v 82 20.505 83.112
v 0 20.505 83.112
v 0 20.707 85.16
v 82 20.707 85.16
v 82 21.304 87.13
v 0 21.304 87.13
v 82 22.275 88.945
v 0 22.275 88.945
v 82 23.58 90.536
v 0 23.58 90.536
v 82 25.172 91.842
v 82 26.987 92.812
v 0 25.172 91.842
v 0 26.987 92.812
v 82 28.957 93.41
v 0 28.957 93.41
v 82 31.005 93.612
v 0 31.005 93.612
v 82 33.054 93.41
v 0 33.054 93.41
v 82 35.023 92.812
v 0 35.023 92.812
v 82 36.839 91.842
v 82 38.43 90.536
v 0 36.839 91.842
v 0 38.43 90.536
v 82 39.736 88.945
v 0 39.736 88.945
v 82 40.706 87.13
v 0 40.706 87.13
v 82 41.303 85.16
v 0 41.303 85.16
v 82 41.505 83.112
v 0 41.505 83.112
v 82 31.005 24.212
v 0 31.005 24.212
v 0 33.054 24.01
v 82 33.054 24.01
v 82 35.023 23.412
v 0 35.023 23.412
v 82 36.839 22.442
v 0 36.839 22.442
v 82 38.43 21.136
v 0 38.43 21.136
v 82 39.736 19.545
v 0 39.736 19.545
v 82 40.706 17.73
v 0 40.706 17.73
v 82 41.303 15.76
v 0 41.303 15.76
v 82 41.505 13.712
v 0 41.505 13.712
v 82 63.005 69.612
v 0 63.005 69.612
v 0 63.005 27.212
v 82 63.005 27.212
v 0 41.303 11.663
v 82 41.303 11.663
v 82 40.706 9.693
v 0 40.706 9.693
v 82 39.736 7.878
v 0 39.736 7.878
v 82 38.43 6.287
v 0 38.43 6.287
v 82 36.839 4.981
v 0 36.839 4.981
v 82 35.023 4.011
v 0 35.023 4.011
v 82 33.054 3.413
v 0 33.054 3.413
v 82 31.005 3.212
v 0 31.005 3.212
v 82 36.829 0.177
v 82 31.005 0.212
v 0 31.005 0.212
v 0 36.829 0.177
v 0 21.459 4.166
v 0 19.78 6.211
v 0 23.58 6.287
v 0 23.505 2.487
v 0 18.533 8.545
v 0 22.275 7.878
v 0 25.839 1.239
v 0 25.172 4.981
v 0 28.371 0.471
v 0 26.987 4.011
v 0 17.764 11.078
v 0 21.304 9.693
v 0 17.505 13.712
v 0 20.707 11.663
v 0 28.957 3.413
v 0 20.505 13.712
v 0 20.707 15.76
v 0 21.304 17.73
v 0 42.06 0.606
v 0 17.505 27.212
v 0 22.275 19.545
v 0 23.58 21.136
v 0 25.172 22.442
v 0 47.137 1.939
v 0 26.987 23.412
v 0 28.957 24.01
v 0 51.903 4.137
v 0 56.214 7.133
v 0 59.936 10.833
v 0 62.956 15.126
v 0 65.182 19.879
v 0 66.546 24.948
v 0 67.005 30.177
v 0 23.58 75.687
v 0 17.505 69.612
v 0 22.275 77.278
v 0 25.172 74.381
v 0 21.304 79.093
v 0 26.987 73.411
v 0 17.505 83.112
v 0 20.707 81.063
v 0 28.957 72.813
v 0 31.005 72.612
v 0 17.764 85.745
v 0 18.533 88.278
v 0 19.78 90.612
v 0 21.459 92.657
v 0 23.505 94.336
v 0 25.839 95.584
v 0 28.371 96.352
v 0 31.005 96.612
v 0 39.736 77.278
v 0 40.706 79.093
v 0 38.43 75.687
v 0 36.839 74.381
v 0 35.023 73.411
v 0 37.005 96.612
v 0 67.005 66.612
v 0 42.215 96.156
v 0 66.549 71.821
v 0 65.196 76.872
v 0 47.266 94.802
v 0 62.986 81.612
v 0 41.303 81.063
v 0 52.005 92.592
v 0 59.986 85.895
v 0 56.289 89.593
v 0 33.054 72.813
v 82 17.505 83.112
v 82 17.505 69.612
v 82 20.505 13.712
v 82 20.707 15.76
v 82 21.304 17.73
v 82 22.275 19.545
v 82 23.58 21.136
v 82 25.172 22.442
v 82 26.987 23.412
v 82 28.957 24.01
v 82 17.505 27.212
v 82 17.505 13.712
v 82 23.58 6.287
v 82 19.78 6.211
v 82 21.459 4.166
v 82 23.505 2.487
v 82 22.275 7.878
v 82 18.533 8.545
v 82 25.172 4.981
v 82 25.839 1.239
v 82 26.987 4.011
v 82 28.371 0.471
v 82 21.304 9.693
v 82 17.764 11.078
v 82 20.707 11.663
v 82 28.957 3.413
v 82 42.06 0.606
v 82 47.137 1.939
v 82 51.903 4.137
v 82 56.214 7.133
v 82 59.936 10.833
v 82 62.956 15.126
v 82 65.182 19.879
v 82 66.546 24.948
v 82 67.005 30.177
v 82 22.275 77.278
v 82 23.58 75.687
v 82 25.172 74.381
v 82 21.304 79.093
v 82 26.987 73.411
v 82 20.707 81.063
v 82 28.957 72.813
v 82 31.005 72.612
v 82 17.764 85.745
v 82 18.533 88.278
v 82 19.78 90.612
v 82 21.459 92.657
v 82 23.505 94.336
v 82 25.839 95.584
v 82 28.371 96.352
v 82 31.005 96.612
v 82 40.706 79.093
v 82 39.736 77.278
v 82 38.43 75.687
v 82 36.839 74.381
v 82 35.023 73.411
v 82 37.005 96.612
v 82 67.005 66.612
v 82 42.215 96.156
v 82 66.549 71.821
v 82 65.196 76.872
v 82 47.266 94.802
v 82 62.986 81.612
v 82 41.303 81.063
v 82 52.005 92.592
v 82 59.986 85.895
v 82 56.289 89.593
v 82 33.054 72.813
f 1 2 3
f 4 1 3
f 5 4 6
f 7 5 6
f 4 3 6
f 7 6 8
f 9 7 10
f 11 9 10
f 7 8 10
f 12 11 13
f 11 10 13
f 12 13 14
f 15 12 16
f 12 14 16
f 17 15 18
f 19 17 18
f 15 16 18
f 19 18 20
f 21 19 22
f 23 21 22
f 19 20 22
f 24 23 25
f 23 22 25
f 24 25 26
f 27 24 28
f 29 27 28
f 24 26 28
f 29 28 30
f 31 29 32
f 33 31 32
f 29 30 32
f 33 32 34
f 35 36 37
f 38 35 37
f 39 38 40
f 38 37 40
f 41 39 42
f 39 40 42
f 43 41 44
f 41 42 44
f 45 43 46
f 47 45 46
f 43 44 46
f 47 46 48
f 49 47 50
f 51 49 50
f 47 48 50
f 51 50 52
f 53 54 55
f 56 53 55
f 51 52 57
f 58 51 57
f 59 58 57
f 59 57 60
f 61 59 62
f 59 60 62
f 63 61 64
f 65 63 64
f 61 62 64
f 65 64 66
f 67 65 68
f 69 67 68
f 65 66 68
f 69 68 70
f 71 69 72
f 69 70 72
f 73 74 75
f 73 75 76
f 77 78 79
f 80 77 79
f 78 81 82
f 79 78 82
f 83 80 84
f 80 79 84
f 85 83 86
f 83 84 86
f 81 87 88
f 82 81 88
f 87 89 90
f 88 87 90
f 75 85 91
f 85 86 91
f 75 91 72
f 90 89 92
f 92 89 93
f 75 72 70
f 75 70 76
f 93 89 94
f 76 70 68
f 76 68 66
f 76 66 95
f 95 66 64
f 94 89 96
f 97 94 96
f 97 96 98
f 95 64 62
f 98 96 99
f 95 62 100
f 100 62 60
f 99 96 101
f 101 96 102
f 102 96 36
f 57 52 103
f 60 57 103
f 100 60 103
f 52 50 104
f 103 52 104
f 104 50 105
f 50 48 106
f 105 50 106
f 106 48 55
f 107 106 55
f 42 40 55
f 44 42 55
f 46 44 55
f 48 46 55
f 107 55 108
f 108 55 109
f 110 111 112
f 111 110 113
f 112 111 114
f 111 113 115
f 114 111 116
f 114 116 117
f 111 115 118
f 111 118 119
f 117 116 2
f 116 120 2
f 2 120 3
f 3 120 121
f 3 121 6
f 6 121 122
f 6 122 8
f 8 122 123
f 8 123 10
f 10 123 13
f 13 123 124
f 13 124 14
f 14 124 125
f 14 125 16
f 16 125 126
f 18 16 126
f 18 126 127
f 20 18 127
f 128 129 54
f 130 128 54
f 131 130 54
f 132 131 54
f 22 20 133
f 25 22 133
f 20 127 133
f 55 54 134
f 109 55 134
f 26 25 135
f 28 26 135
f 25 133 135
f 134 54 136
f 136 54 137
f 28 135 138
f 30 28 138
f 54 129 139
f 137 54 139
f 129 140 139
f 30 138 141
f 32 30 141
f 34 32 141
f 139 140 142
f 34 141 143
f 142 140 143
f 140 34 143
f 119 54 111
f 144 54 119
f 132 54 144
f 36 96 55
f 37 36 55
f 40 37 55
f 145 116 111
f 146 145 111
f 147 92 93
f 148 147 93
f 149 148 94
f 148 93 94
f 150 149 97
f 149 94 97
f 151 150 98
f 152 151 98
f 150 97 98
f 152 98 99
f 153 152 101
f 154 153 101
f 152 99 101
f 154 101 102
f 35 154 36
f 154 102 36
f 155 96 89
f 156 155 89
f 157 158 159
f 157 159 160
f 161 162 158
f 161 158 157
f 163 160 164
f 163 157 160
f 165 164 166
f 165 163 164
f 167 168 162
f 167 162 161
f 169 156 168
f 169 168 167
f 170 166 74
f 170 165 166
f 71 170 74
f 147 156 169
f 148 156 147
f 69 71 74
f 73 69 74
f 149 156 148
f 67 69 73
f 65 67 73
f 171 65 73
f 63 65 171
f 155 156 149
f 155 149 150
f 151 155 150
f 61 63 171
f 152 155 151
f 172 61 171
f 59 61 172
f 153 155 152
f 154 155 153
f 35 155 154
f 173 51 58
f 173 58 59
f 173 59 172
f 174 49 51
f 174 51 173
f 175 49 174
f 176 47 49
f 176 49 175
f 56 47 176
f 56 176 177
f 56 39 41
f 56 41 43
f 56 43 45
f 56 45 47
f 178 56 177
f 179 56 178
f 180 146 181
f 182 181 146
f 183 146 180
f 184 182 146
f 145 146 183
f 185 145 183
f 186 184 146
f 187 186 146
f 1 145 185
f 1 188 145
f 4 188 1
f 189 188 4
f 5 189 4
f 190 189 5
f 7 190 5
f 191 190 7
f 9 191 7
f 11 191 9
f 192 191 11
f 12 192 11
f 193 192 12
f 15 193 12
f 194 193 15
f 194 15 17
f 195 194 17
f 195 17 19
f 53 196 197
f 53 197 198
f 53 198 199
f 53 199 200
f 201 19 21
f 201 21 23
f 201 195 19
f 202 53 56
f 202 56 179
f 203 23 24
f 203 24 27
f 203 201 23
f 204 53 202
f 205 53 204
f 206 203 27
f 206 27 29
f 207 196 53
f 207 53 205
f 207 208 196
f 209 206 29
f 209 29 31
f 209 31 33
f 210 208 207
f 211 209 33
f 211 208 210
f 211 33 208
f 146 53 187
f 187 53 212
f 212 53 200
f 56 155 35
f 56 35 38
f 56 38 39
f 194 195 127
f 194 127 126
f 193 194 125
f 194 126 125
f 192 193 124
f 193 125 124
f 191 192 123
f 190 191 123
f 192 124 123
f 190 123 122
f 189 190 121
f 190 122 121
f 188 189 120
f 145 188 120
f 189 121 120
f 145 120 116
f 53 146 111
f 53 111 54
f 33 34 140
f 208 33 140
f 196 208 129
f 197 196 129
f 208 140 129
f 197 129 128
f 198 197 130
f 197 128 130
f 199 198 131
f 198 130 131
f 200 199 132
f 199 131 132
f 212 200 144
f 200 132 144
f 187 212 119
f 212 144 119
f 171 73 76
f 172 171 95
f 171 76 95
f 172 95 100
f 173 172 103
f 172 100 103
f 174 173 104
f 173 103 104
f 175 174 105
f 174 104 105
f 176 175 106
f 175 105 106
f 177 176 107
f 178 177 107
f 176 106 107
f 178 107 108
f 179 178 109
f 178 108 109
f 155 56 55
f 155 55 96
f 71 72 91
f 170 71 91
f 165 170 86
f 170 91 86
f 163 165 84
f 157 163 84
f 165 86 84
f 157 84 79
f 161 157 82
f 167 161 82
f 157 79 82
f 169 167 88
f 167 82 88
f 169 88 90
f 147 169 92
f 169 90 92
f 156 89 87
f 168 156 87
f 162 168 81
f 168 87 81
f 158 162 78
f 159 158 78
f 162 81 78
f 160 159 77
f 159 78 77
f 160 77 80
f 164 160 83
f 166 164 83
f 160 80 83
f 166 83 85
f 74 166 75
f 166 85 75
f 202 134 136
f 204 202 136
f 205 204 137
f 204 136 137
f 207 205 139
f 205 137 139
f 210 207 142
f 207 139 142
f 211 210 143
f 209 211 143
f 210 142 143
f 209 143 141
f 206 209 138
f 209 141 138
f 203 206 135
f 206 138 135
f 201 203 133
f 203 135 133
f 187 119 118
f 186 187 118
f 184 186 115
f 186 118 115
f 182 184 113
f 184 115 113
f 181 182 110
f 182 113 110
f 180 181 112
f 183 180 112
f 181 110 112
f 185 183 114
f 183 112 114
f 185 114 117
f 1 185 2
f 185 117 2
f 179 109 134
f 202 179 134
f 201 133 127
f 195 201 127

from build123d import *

# Parameters (mm, degrees)
F1_DEPTH = 82


with BuildPart() as f1:
    # F0 (on Right) → F1 (new body)
    with BuildSketch(Plane.YZ):
        with BuildLine():
            Line((17.505096594, 69.6115375847), (31.005096594, 69.6115375847))
            ThreePointArc((31.005096594, 69.6115375847), (21.459155048, 73.5655960386), (17.505096594, 83.1115375847))
            Line((17.505096594, 83.1115375847), (17.505096594, 69.6115375847))
        make_face()
        with BuildLine():
            ThreePointArc((17.505096594, 13.7115375847), (21.459155048, 23.2574791307), (31.005096594, 27.2115375847))
            Line((31.005096594, 27.2115375847), (17.505096594, 27.2115375847))
            Line((17.505096594, 27.2115375847), (17.505096594, 13.7115375847))
        make_face()
        with BuildLine():
            Line((31.005096594, 0.2115375847), (31.005096594, 3.2115375847))
            ThreePointArc((31.005096594, 3.2115375847), (23.5804753915, 6.2869163822), (20.505096594, 13.7115375847))
            Line((20.505096594, 13.7115375847), (17.505096594, 13.7115375847))
            ThreePointArc((17.505096594, 13.7115375847), (21.459155048, 4.1655960386), (31.005096594, 0.2115375847))
        make_face()
        with BuildLine():
            ThreePointArc((20.505096594, 13.7115375847), (23.5804753915, 21.1361587871), (31.005096594, 24.2115375847))
            Line((31.005096594, 24.2115375847), (31.005096594, 27.2115375847))
            ThreePointArc((31.005096594, 27.2115375847), (21.459155048, 23.2574791307), (17.505096594, 13.7115375847))
            Line((17.505096594, 13.7115375847), (20.505096594, 13.7115375847))
        make_face()
        with BuildLine():
            Line((44.505096594, 13.7115375847), (41.505096594, 13.7115375847))
            ThreePointArc((41.505096594, 13.7115375847), (38.4297177964, 6.2869163822), (31.005096594, 3.2115375847))
            Line((31.005096594, 3.2115375847), (31.005096594, 0.2115375847))
            ThreePointArc((31.005096594, 0.2115375847), (40.55103814, 4.1655960386), (44.505096594, 13.7115375847))
        make_face()
        with BuildLine():
            ThreePointArc((31.005096594, 96.6115375847), (21.459155048, 92.6574791307), (17.505096594, 83.1115375847))
            Line((17.505096594, 83.1115375847), (20.505096594, 83.1115375847))
            ThreePointArc((20.505096594, 83.1115375847), (31.005096594, 93.6115375847), (41.505096594, 83.1115375847))
            Line((41.505096594, 83.1115375847), (44.505096594, 83.1115375847))
            ThreePointArc((44.505096594, 83.1115375847), (40.55103814, 92.6574791307), (31.005096594, 96.6115375847))
        make_face()
        with BuildLine():
            ThreePointArc((17.505096594, 83.1115375847), (21.459155048, 73.5655960386), (31.005096594, 69.6115375847))
            Line((31.005096594, 69.6115375847), (31.005096594, 72.6115375847))
            ThreePointArc((31.005096594, 72.6115375847), (23.5804753915, 75.6869163822), (20.505096594, 83.1115375847))
            Line((20.505096594, 83.1115375847), (17.505096594, 83.1115375847))
        make_face()
        with BuildLine():
            Line((44.505096594, 27.2115375847), (44.505096594, 13.7115375847))
            ThreePointArc((44.505096594, 13.7115375847), (40.55103814, 4.1655960386), (31.005096594, 0.2115375847))
            Line((31.005096594, 0.2115375847), (36.8288183167, 0.1773171395))
            ThreePointArc((36.8288183167, 0.1773171395), (58.1558844242, 8.901363301), (67.005096594, 30.1767992345))
            Line((67.005096594, 30.1767992345), (67.005096594, 66.6115375847))
            ThreePointArc((67.005096594, 66.6115375847), (58.2183000296, 87.8247410203), (37.005096594, 96.6115375847))
            Line((37.005096594, 96.6115375847), (31.005096594, 96.6115375847))
            ThreePointArc((31.005096594, 96.6115375847), (40.55103814, 92.6574791307), (44.505096594, 83.1115375847))
            Line((44.505096594, 83.1115375847), (44.505096594, 69.6115375847))
            Line((44.505096594, 69.6115375847), (63.005096594, 69.6115375847))
            Line((63.005096594, 69.6115375847), (63.005096594, 27.2115375847))
            Line((63.005096594, 27.2115375847), (44.505096594, 27.2115375847))
        make_face()
        with BuildLine():
            ThreePointArc((31.005096594, 27.2115375847), (40.55103814, 23.2574791307), (44.505096594, 13.7115375847))
            Line((44.505096594, 13.7115375847), (44.505096594, 27.2115375847))
            Line((44.505096594, 27.2115375847), (31.005096594, 27.2115375847))
        make_face()
        with BuildLine():
            ThreePointArc((31.005096594, 24.2115375847), (38.4297177964, 21.1361587871), (41.505096594, 13.7115375847))
            Line((41.505096594, 13.7115375847), (44.505096594, 13.7115375847))
            ThreePointArc((44.505096594, 13.7115375847), (40.55103814, 23.2574791307), (31.005096594, 27.2115375847))
            Line((31.005096594, 27.2115375847), (31.005096594, 24.2115375847))
        make_face()
        with BuildLine():
            ThreePointArc((44.505096594, 83.1115375847), (40.55103814, 73.5655960386), (31.005096594, 69.6115375847))
            Line((31.005096594, 69.6115375847), (44.505096594, 69.6115375847))
            Line((44.505096594, 69.6115375847), (44.505096594, 83.1115375847))
        make_face()
        with BuildLine():
            Line((31.005096594, 72.6115375847), (31.005096594, 69.6115375847))
            ThreePointArc((31.005096594, 69.6115375847), (40.55103814, 73.5655960386), (44.505096594, 83.1115375847))
            Line((44.505096594, 83.1115375847), (41.505096594, 83.1115375847))
            ThreePointArc((41.505096594, 83.1115375847), (38.4297177964, 75.6869163822), (31.005096594, 72.6115375847))
        make_face()
    extrude(amount=F1_DEPTH)


solid = f1.part
